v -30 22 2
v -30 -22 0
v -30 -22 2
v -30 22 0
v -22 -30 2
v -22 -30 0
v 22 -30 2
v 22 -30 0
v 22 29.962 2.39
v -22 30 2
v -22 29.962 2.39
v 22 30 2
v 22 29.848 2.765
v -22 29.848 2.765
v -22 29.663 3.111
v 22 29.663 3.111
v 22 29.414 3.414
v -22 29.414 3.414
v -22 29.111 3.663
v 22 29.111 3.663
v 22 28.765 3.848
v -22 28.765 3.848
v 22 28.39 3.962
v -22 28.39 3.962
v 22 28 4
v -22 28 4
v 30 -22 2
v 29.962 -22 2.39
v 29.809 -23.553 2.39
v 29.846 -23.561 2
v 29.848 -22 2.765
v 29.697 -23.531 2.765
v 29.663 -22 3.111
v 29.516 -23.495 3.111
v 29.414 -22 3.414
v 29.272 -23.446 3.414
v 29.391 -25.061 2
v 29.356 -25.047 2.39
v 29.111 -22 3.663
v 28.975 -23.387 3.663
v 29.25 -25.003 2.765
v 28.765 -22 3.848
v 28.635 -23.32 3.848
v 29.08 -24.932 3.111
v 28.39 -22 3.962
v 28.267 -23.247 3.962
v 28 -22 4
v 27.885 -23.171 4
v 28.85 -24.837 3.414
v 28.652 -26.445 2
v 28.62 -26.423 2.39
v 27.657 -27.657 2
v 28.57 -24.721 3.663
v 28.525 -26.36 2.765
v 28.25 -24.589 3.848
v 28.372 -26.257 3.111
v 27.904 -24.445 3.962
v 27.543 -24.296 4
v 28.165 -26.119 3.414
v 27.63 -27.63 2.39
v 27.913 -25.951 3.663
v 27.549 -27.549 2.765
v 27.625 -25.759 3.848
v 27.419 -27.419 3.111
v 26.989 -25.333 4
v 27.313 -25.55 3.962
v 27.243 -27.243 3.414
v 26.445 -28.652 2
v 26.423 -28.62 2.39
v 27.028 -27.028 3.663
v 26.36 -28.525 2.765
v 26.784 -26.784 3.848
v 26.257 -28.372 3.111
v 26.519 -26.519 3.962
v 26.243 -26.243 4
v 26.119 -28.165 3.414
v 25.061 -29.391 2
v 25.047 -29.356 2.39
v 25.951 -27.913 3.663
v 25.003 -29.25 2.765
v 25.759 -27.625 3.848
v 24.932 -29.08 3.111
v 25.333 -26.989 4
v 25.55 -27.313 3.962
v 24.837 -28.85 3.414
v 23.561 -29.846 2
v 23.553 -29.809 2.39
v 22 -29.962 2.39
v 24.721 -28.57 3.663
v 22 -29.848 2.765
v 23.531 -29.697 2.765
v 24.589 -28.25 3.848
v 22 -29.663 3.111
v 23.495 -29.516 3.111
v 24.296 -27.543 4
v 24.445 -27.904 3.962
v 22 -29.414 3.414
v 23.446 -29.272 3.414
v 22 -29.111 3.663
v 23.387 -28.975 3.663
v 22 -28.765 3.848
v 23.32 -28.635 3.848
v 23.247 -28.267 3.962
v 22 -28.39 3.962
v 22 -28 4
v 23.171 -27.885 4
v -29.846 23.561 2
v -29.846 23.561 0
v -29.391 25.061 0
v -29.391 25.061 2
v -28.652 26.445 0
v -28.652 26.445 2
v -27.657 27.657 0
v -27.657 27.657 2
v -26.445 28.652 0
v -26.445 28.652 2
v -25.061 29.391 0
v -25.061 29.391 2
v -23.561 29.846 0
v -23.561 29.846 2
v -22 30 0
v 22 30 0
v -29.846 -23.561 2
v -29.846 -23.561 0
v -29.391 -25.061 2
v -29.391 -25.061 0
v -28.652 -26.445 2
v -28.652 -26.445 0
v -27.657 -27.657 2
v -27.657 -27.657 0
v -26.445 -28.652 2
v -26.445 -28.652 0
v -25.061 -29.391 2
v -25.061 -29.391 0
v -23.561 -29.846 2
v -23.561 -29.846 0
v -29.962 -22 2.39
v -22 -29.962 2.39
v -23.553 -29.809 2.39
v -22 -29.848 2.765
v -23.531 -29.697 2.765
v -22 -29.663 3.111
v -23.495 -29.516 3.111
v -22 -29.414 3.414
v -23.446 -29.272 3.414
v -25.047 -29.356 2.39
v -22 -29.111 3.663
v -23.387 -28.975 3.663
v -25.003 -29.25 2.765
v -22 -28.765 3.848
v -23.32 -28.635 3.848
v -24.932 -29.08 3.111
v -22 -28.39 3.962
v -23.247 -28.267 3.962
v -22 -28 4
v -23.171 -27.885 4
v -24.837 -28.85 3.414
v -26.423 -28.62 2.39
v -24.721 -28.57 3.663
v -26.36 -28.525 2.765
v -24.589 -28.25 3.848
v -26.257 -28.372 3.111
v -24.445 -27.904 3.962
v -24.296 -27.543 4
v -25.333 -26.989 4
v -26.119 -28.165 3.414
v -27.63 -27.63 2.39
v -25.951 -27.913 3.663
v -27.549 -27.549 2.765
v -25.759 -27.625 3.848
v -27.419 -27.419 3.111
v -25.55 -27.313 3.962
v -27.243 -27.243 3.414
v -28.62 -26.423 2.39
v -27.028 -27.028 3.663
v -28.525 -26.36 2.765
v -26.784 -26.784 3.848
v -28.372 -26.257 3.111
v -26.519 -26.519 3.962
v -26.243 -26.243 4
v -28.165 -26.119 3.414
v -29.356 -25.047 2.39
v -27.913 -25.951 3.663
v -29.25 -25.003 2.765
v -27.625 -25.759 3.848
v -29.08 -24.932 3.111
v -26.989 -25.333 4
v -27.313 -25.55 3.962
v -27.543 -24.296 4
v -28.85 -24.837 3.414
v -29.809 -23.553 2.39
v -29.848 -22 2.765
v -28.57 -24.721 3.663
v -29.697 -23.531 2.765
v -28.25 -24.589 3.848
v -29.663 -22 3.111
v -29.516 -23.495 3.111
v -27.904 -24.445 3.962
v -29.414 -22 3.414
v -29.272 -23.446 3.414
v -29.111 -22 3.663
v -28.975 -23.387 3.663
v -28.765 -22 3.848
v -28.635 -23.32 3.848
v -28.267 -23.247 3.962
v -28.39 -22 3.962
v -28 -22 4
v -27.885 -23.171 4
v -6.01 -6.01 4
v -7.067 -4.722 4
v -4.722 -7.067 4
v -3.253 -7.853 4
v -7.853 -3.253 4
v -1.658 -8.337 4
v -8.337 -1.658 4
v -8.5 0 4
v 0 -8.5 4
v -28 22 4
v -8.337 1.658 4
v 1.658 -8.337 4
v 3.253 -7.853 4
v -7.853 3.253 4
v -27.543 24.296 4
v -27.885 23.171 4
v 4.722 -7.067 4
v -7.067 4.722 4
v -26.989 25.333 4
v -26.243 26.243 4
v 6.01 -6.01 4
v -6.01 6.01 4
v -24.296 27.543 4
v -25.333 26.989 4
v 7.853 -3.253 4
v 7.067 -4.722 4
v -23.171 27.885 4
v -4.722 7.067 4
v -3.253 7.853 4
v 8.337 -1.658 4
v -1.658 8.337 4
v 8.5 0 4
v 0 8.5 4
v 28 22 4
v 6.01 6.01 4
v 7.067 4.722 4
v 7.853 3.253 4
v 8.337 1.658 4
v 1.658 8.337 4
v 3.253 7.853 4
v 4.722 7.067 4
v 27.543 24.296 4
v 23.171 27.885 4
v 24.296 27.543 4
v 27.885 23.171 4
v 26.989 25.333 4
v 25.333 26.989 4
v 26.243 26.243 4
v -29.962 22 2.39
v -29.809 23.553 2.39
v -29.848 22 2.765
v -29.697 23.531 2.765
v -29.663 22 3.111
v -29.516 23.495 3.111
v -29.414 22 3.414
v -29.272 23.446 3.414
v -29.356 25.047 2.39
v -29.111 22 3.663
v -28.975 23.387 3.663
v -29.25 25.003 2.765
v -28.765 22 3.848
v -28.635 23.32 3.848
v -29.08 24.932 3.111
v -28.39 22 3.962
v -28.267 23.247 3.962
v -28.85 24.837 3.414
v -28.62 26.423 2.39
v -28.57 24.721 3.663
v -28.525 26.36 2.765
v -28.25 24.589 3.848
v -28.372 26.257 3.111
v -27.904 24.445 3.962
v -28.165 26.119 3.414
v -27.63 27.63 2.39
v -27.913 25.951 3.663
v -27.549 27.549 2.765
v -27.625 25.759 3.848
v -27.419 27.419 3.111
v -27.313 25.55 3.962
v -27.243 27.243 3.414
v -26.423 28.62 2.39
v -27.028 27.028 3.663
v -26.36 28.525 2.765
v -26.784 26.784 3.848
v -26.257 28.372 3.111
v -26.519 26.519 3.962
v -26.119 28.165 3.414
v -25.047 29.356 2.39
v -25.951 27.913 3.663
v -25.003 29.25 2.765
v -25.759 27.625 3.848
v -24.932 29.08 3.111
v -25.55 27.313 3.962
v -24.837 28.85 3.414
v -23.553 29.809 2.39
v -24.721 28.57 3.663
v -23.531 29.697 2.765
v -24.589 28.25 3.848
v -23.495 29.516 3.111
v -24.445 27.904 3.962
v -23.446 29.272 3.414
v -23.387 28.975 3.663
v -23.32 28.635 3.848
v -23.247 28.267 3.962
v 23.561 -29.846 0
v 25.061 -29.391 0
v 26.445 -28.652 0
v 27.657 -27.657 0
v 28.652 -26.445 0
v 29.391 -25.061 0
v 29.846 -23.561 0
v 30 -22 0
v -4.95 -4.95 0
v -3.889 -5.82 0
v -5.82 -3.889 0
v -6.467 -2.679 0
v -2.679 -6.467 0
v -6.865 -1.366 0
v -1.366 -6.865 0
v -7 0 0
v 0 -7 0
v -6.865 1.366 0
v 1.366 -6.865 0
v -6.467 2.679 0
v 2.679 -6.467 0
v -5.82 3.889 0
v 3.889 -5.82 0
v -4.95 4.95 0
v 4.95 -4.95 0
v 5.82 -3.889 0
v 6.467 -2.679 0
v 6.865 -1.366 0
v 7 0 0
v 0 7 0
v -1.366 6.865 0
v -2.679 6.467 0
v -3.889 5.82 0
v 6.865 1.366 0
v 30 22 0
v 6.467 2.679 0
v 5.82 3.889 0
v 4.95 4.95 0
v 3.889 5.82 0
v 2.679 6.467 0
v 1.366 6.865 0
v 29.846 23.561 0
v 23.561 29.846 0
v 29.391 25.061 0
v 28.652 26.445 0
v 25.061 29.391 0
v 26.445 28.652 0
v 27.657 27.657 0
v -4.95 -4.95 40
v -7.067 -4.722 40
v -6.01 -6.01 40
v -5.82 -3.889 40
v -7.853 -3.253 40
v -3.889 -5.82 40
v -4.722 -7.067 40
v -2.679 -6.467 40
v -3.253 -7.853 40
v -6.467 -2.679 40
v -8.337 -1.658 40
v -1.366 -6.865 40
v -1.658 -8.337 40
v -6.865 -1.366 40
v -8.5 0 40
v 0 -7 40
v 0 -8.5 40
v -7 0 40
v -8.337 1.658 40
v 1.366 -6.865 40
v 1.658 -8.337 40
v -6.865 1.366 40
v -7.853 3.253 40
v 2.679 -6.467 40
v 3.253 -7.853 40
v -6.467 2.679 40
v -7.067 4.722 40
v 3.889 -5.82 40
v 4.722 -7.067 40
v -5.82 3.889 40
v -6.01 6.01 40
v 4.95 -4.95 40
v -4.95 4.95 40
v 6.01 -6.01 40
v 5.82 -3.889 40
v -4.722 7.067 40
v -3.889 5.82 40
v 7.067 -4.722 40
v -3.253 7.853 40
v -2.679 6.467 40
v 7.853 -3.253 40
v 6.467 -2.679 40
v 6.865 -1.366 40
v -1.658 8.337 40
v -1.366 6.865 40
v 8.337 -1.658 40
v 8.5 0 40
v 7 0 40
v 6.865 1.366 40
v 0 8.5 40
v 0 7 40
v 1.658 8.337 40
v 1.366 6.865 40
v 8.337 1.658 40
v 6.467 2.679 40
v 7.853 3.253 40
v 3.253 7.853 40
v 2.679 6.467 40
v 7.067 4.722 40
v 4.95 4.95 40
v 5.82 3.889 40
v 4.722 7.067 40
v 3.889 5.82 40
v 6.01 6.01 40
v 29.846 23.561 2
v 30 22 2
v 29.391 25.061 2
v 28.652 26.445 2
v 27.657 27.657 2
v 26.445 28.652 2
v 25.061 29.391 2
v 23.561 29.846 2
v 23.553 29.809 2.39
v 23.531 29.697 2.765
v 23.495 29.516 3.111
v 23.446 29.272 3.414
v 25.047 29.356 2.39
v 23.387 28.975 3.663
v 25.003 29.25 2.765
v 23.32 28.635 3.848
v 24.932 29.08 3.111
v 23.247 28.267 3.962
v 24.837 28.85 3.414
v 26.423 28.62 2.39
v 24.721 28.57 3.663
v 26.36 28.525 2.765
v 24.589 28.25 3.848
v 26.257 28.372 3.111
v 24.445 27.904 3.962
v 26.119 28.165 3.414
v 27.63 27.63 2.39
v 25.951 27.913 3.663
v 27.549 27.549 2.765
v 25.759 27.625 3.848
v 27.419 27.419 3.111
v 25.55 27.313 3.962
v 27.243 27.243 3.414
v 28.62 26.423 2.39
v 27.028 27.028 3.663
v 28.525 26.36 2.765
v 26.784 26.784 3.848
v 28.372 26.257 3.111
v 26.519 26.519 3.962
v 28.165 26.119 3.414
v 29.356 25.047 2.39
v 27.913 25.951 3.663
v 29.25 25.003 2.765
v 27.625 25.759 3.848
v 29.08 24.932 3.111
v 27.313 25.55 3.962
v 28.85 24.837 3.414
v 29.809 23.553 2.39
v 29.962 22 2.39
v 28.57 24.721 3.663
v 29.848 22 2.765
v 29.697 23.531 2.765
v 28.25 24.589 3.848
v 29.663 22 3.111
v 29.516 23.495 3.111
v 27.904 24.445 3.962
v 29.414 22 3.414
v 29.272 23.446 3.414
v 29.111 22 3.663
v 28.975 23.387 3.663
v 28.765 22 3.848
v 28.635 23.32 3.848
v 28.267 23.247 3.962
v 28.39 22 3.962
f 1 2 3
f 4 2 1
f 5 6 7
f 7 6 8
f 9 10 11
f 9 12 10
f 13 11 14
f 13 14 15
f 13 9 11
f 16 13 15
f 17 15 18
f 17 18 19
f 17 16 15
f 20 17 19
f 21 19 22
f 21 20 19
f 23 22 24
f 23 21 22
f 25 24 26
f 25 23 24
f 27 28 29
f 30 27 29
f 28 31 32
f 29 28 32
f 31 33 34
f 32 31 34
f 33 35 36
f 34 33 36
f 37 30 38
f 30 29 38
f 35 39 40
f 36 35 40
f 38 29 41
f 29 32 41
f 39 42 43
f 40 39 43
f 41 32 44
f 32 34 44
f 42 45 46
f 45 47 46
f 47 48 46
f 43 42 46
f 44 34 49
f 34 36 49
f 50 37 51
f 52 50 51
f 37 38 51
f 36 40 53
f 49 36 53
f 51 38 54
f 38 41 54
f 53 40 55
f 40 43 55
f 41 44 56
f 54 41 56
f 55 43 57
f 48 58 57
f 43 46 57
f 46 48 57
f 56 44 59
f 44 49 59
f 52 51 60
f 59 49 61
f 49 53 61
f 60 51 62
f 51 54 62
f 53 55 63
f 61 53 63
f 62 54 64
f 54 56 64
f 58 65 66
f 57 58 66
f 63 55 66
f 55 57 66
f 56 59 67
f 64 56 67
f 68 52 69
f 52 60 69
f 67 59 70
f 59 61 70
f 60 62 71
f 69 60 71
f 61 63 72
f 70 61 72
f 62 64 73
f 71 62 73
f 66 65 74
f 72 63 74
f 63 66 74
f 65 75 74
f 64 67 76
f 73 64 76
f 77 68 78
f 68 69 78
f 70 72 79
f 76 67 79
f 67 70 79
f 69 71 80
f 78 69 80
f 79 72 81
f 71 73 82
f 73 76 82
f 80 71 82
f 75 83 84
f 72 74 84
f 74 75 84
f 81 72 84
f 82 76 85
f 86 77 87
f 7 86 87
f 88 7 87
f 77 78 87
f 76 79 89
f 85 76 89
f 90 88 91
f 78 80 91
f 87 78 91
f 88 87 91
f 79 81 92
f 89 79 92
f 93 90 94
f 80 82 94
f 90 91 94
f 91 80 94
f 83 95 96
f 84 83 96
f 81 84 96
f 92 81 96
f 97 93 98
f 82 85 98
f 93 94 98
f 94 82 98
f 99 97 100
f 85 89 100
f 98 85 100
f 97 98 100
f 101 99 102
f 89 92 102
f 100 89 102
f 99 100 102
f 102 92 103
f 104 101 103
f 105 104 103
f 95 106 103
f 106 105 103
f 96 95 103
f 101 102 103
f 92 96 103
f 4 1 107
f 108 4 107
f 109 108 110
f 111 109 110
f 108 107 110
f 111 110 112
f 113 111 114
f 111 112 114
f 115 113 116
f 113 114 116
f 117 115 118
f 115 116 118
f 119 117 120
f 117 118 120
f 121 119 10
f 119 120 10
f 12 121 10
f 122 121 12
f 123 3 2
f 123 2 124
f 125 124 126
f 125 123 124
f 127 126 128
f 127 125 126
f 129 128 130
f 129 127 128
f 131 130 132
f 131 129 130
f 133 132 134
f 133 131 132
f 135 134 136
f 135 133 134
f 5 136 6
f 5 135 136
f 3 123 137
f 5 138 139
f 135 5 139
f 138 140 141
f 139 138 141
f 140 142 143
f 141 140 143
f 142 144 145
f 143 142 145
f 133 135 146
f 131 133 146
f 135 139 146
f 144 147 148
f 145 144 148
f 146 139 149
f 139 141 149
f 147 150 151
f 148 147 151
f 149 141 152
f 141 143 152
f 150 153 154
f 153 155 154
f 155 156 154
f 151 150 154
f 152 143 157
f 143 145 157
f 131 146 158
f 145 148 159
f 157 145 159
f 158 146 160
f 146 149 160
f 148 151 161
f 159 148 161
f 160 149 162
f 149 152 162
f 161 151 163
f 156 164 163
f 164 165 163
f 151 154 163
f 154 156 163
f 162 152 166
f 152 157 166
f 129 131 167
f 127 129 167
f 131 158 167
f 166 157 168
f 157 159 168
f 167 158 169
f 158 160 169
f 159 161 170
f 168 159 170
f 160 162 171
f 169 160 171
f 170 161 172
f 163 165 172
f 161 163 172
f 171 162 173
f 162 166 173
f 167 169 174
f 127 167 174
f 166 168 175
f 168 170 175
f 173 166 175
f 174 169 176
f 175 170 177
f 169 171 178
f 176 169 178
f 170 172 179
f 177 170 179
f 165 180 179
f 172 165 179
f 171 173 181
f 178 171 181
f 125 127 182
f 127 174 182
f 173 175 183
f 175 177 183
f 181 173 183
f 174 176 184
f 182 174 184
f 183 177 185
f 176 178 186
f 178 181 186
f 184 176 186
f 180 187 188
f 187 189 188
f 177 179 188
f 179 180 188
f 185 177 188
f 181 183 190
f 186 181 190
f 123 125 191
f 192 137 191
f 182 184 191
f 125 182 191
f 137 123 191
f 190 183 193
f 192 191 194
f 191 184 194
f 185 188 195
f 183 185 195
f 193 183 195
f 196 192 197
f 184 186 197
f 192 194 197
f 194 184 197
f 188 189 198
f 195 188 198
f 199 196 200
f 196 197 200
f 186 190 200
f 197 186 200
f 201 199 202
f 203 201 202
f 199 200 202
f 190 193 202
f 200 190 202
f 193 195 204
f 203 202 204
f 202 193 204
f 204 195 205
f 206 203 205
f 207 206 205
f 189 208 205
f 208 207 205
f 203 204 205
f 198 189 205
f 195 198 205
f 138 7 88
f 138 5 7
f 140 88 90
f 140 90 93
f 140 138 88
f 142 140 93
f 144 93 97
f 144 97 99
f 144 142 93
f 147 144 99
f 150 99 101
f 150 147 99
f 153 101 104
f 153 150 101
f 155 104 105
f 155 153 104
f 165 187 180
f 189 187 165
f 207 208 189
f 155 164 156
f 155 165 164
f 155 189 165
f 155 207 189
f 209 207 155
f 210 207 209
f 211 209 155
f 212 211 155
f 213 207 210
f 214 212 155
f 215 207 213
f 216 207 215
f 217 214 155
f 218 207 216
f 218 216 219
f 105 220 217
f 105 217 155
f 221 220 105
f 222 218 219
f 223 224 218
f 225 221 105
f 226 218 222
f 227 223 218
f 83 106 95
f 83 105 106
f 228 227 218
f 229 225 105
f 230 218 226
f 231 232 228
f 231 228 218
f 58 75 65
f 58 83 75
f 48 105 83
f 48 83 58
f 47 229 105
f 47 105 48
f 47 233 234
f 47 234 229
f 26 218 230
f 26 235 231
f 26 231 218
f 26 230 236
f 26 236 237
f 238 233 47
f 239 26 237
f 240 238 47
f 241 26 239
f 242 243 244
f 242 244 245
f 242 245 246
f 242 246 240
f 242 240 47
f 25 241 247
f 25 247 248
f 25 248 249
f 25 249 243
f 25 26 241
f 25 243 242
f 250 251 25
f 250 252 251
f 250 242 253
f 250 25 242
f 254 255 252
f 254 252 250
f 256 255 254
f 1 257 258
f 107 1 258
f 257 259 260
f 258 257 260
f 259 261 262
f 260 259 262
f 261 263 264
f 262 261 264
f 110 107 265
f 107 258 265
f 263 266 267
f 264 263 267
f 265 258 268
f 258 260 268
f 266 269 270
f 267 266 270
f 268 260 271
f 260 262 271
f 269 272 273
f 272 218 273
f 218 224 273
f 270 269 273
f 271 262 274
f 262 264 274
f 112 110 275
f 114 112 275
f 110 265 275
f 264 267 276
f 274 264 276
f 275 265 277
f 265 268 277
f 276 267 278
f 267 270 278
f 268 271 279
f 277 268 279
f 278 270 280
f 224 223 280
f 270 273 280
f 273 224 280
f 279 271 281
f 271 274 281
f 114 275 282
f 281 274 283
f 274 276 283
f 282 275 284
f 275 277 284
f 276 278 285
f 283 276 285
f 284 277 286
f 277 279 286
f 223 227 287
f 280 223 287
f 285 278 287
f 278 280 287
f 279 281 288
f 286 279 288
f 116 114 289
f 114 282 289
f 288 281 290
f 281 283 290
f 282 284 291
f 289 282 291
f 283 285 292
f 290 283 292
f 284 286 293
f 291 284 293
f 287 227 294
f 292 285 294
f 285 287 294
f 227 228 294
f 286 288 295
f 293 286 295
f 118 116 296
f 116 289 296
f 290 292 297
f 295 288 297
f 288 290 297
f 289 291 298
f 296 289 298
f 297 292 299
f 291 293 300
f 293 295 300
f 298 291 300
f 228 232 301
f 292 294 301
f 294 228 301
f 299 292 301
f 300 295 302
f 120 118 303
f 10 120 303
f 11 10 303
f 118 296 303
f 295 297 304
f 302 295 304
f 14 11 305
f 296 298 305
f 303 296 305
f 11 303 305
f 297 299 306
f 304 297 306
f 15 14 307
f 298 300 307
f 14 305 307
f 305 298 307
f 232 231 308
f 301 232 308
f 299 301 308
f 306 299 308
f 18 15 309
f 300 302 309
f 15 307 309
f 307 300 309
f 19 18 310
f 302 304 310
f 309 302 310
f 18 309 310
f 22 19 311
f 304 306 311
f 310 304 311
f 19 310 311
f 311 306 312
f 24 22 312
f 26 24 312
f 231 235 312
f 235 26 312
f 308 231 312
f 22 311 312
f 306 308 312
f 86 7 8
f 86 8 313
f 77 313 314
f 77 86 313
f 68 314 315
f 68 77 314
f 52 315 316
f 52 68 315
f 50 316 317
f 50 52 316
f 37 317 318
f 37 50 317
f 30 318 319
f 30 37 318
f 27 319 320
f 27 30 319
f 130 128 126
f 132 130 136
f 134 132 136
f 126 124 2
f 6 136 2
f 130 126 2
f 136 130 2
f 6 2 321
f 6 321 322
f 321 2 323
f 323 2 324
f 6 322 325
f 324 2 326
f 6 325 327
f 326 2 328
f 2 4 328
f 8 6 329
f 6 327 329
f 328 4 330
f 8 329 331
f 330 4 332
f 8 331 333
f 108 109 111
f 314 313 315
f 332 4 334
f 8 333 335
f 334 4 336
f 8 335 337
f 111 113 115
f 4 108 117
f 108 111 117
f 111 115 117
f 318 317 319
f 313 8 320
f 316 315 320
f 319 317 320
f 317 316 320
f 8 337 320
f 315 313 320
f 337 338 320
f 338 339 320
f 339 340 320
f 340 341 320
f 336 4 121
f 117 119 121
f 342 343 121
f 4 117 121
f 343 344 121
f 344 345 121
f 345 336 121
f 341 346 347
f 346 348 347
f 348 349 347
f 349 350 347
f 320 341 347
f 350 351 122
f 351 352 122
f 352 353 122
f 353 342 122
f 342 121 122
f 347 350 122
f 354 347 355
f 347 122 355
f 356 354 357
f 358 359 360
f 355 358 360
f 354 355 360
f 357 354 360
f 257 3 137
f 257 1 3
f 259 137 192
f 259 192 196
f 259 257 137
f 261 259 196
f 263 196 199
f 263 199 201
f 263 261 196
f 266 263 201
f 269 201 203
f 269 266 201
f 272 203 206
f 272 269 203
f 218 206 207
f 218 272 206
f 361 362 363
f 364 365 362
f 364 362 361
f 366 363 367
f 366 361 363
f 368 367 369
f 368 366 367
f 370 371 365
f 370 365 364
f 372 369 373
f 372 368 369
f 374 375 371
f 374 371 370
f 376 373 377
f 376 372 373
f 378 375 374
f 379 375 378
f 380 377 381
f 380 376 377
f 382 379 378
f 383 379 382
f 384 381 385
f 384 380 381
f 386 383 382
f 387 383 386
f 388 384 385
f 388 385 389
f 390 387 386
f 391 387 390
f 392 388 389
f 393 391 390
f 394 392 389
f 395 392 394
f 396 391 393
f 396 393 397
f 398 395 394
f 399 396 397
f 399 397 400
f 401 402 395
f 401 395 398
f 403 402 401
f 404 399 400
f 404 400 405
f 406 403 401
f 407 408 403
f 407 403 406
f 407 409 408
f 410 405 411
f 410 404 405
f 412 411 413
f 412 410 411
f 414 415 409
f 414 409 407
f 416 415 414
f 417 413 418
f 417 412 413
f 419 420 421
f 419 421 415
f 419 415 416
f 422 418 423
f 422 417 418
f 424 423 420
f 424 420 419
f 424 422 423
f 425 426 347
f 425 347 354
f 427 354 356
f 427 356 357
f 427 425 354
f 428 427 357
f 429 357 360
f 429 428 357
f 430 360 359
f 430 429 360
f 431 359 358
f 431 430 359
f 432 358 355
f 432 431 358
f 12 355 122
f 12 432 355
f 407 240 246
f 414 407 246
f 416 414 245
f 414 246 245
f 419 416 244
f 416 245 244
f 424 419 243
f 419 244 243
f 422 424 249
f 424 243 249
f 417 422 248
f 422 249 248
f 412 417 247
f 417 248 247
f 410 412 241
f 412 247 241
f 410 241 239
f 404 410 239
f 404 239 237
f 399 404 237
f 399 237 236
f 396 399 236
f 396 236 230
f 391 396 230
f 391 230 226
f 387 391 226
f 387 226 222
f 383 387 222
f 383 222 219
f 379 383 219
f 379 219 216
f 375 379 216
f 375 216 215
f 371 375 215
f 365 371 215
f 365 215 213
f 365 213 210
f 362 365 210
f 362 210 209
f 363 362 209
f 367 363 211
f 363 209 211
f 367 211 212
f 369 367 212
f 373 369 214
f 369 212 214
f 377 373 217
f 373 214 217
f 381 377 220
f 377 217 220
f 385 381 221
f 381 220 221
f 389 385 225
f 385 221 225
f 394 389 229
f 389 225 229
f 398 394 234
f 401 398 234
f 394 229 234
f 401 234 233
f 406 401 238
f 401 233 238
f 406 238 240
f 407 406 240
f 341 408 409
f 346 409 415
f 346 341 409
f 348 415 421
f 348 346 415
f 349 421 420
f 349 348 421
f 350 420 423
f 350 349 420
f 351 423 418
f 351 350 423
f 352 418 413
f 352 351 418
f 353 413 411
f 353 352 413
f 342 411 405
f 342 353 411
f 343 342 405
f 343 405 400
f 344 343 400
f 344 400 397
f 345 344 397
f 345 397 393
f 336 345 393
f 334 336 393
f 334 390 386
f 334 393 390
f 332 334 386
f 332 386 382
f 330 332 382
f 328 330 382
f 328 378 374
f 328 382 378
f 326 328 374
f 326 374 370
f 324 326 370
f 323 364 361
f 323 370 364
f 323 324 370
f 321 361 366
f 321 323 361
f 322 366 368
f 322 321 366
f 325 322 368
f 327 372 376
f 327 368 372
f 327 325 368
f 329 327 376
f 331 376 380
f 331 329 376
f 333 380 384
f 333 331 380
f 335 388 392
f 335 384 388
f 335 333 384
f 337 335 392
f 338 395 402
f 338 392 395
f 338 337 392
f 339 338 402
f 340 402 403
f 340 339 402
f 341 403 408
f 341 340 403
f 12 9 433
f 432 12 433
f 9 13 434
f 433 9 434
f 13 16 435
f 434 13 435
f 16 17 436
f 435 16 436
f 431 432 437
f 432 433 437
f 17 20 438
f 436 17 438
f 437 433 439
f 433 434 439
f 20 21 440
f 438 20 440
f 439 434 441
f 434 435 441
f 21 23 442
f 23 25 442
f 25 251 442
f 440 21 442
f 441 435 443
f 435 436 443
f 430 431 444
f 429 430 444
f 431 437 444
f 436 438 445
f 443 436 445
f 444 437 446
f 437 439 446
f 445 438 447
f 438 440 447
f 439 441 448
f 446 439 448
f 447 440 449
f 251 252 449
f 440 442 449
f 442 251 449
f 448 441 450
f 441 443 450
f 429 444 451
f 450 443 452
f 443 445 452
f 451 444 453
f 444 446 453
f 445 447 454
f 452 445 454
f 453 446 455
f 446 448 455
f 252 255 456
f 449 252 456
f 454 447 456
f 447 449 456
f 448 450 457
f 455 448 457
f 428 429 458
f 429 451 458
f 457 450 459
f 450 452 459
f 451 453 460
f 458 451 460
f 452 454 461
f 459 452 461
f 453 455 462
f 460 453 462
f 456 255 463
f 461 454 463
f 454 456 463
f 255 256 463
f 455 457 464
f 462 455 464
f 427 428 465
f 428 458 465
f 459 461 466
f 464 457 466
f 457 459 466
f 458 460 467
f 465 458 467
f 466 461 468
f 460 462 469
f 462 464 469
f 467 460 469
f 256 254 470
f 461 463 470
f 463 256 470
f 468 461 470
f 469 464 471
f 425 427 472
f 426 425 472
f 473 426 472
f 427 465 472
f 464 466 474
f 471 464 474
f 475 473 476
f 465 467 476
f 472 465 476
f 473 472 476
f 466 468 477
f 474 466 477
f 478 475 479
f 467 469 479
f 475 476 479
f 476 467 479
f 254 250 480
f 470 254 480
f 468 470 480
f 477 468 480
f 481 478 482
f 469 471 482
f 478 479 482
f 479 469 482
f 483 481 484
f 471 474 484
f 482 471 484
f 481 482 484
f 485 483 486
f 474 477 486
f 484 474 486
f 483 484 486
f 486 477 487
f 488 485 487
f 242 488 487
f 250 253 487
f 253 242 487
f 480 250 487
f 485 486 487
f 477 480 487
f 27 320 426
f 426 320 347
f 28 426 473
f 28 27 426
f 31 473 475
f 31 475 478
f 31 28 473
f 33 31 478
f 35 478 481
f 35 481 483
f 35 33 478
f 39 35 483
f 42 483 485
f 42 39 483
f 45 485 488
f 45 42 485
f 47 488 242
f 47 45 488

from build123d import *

# Parameters (mm, degrees)
CYLINDER001_R     = 7
CYLINDER001_DEPTH = 50
CYLINDER_R        = 8.5
CYLINDER_DEPTH    = 40
BOX_W             = 60
BOX_H             = 60
BOX_DEPTH         = 4
FILLET_R          = 8
FILLET001_R       = 2


with BuildPart() as cylinder001:
    # Cylinder001 → Cylinder001 (new body)
    with BuildSketch(Plane.XY):
        Circle(CYLINDER001_R)
    extrude(amount=CYLINDER001_DEPTH)


with BuildPart() as cylinder:
    # Cylinder → Cylinder (new body)
    with BuildSketch(Plane.XY):
        Circle(CYLINDER_R)
    extrude(amount=CYLINDER_DEPTH)


with BuildPart() as cut:
    # Box → Box (new body)
    with BuildSketch(Plane(origin=(-30, -30, 0), x_dir=(1, 0, 0), z_dir=(0, 0, 1))):
        with Locations((30, 30)):
            Rectangle(BOX_W, BOX_H)
    extrude(amount=BOX_DEPTH)

    # Fillet
    fillet_edges = [cut.edges().sort_by_distance(p)[0] for p in [
        (-30, -30, 2),
        (-30, 30, 2),
        (30, -30, 2),
        (30, 30, 2),
    ]]
    fillet(fillet_edges, radius=FILLET_R)

    # Fillet001
    fillet001_edges = [cut.edges().sort_by_distance(p)[0] for p in [
        (-30, 0, 4),
        (-27.656854, -27.656854, 4),
        (-27.656854, 27.656854, 4),
        (0, -30, 4),
        (0, 30, 4),
        (27.656854, -27.656854, 4),
        (27.656854, 27.656854, 4),
        (30, 0, 4),
    ]]
    fillet(fillet001_edges, radius=FILLET001_R)

    # Fusion: union Cylinder
    add(cylinder.part)

    # Cut: cut Cylinder001
    add(cylinder001.part, mode=Mode.SUBTRACT)


solid = cut.part
